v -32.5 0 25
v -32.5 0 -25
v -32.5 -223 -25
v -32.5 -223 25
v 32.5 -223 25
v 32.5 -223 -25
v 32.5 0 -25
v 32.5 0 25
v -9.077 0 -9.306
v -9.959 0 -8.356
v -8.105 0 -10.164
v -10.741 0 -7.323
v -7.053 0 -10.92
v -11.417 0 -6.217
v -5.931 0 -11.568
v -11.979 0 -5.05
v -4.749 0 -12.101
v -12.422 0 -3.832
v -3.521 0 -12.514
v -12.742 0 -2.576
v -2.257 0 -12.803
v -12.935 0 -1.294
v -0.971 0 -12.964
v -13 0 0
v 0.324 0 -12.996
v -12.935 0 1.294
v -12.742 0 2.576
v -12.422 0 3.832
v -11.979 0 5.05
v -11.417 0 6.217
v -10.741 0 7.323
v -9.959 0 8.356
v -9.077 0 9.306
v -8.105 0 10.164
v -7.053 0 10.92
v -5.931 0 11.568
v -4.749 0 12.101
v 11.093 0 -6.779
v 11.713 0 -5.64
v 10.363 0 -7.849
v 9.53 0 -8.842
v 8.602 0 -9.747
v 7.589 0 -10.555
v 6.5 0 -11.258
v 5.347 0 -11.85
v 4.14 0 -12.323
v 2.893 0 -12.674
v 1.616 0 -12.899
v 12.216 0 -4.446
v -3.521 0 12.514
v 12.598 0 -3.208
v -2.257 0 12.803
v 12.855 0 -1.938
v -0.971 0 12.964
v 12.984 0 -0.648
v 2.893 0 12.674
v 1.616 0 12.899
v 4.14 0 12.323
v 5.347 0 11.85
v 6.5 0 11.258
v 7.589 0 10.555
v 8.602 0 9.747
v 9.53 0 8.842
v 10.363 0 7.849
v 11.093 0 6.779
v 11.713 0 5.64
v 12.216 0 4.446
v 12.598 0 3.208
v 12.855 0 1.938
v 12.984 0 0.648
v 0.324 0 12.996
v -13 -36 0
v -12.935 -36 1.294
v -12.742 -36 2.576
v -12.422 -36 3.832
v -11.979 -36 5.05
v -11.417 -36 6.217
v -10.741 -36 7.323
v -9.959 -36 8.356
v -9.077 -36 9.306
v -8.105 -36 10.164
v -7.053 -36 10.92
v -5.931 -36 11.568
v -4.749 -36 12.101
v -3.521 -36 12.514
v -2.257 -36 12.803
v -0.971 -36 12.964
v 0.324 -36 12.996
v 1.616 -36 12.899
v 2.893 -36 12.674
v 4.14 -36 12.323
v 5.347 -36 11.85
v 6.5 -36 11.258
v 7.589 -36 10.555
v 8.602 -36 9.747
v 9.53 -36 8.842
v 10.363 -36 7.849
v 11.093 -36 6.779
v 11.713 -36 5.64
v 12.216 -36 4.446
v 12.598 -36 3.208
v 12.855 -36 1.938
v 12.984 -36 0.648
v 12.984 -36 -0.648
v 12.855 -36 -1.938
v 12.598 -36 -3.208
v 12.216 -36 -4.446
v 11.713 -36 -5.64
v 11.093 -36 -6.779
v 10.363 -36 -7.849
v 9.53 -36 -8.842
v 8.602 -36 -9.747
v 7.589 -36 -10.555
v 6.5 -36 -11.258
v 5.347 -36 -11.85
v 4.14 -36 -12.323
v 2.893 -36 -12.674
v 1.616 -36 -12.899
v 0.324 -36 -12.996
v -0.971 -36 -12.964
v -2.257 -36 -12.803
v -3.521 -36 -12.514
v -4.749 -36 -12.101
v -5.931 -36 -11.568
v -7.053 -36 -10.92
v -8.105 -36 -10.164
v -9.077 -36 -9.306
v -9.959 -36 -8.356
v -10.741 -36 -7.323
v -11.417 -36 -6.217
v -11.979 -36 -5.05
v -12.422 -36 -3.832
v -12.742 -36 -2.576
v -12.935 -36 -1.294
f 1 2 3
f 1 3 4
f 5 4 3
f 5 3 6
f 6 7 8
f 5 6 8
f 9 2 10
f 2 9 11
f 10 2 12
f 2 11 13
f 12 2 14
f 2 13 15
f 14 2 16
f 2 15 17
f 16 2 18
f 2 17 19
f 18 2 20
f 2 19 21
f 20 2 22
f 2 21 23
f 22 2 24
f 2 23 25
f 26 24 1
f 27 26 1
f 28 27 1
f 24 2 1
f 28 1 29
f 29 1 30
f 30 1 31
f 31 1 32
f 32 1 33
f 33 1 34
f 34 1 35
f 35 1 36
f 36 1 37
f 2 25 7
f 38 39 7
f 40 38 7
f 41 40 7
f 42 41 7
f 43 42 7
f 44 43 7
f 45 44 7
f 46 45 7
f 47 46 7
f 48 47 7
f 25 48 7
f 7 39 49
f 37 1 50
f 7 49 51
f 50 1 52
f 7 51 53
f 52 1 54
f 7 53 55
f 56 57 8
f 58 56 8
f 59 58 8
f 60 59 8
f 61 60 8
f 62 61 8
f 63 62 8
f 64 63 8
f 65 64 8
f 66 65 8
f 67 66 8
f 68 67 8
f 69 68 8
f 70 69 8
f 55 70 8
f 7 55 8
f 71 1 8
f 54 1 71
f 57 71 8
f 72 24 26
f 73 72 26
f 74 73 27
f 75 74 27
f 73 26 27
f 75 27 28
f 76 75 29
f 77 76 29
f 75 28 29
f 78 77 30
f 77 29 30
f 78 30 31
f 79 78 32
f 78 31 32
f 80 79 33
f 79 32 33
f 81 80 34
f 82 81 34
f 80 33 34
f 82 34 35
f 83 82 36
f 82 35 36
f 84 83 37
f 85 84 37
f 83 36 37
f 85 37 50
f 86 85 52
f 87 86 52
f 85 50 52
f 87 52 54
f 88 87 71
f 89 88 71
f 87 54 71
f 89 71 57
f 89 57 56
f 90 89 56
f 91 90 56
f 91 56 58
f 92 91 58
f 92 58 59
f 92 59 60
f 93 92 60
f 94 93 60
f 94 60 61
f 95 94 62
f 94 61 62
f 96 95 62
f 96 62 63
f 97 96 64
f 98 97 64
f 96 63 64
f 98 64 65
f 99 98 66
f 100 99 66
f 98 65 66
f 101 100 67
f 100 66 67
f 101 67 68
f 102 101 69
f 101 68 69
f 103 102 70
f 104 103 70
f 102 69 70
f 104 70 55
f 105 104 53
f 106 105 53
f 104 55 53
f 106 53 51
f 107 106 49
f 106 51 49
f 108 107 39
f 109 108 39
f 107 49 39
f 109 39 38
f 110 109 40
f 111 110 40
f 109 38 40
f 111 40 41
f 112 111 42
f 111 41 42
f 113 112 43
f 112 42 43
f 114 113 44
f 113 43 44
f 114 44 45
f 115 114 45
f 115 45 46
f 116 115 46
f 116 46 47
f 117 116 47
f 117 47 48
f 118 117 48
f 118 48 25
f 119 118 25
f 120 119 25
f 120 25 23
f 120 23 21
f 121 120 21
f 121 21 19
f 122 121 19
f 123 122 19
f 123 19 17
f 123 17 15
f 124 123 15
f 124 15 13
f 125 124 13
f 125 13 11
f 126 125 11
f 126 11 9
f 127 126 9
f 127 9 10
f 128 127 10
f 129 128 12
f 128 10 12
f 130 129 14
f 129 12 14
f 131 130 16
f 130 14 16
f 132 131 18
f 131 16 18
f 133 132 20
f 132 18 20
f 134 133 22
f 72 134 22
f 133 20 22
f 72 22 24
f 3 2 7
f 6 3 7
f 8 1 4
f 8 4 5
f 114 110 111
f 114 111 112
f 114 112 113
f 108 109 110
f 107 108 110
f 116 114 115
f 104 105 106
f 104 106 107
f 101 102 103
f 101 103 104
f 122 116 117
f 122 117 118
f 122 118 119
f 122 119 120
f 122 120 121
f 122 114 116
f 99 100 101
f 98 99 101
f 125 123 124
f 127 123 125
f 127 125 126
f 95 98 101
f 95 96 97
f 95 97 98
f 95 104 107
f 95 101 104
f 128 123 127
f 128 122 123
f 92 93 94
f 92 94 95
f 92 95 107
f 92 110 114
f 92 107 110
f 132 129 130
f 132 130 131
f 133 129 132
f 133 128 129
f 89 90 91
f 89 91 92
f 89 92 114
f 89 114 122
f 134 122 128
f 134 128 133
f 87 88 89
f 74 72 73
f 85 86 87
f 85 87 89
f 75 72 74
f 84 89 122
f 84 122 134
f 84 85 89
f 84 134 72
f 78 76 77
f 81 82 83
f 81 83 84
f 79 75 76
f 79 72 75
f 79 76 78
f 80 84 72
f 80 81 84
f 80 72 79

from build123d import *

# Parameters (mm, degrees)
F0_W     = 65
F0_H     = 50
F1_DEPTH = 223
F3_R     = 13
F4_DEPTH = 36


with BuildPart() as f1:
    # F0 (on Front) → F1 (new body)
    with BuildSketch(Plane.XZ):
        Rectangle(F0_W, F0_H)
    extrude(amount=F1_DEPTH)

    # F3 (on face) → F4 (cut)
    with BuildSketch(Plane(origin=(0, 0, 0), x_dir=(-1, 0, 0), z_dir=(0, 1, 0))):
        Circle(F3_R)
    extrude(amount=-F4_DEPTH, mode=Mode.SUBTRACT)


solid = f1.part
